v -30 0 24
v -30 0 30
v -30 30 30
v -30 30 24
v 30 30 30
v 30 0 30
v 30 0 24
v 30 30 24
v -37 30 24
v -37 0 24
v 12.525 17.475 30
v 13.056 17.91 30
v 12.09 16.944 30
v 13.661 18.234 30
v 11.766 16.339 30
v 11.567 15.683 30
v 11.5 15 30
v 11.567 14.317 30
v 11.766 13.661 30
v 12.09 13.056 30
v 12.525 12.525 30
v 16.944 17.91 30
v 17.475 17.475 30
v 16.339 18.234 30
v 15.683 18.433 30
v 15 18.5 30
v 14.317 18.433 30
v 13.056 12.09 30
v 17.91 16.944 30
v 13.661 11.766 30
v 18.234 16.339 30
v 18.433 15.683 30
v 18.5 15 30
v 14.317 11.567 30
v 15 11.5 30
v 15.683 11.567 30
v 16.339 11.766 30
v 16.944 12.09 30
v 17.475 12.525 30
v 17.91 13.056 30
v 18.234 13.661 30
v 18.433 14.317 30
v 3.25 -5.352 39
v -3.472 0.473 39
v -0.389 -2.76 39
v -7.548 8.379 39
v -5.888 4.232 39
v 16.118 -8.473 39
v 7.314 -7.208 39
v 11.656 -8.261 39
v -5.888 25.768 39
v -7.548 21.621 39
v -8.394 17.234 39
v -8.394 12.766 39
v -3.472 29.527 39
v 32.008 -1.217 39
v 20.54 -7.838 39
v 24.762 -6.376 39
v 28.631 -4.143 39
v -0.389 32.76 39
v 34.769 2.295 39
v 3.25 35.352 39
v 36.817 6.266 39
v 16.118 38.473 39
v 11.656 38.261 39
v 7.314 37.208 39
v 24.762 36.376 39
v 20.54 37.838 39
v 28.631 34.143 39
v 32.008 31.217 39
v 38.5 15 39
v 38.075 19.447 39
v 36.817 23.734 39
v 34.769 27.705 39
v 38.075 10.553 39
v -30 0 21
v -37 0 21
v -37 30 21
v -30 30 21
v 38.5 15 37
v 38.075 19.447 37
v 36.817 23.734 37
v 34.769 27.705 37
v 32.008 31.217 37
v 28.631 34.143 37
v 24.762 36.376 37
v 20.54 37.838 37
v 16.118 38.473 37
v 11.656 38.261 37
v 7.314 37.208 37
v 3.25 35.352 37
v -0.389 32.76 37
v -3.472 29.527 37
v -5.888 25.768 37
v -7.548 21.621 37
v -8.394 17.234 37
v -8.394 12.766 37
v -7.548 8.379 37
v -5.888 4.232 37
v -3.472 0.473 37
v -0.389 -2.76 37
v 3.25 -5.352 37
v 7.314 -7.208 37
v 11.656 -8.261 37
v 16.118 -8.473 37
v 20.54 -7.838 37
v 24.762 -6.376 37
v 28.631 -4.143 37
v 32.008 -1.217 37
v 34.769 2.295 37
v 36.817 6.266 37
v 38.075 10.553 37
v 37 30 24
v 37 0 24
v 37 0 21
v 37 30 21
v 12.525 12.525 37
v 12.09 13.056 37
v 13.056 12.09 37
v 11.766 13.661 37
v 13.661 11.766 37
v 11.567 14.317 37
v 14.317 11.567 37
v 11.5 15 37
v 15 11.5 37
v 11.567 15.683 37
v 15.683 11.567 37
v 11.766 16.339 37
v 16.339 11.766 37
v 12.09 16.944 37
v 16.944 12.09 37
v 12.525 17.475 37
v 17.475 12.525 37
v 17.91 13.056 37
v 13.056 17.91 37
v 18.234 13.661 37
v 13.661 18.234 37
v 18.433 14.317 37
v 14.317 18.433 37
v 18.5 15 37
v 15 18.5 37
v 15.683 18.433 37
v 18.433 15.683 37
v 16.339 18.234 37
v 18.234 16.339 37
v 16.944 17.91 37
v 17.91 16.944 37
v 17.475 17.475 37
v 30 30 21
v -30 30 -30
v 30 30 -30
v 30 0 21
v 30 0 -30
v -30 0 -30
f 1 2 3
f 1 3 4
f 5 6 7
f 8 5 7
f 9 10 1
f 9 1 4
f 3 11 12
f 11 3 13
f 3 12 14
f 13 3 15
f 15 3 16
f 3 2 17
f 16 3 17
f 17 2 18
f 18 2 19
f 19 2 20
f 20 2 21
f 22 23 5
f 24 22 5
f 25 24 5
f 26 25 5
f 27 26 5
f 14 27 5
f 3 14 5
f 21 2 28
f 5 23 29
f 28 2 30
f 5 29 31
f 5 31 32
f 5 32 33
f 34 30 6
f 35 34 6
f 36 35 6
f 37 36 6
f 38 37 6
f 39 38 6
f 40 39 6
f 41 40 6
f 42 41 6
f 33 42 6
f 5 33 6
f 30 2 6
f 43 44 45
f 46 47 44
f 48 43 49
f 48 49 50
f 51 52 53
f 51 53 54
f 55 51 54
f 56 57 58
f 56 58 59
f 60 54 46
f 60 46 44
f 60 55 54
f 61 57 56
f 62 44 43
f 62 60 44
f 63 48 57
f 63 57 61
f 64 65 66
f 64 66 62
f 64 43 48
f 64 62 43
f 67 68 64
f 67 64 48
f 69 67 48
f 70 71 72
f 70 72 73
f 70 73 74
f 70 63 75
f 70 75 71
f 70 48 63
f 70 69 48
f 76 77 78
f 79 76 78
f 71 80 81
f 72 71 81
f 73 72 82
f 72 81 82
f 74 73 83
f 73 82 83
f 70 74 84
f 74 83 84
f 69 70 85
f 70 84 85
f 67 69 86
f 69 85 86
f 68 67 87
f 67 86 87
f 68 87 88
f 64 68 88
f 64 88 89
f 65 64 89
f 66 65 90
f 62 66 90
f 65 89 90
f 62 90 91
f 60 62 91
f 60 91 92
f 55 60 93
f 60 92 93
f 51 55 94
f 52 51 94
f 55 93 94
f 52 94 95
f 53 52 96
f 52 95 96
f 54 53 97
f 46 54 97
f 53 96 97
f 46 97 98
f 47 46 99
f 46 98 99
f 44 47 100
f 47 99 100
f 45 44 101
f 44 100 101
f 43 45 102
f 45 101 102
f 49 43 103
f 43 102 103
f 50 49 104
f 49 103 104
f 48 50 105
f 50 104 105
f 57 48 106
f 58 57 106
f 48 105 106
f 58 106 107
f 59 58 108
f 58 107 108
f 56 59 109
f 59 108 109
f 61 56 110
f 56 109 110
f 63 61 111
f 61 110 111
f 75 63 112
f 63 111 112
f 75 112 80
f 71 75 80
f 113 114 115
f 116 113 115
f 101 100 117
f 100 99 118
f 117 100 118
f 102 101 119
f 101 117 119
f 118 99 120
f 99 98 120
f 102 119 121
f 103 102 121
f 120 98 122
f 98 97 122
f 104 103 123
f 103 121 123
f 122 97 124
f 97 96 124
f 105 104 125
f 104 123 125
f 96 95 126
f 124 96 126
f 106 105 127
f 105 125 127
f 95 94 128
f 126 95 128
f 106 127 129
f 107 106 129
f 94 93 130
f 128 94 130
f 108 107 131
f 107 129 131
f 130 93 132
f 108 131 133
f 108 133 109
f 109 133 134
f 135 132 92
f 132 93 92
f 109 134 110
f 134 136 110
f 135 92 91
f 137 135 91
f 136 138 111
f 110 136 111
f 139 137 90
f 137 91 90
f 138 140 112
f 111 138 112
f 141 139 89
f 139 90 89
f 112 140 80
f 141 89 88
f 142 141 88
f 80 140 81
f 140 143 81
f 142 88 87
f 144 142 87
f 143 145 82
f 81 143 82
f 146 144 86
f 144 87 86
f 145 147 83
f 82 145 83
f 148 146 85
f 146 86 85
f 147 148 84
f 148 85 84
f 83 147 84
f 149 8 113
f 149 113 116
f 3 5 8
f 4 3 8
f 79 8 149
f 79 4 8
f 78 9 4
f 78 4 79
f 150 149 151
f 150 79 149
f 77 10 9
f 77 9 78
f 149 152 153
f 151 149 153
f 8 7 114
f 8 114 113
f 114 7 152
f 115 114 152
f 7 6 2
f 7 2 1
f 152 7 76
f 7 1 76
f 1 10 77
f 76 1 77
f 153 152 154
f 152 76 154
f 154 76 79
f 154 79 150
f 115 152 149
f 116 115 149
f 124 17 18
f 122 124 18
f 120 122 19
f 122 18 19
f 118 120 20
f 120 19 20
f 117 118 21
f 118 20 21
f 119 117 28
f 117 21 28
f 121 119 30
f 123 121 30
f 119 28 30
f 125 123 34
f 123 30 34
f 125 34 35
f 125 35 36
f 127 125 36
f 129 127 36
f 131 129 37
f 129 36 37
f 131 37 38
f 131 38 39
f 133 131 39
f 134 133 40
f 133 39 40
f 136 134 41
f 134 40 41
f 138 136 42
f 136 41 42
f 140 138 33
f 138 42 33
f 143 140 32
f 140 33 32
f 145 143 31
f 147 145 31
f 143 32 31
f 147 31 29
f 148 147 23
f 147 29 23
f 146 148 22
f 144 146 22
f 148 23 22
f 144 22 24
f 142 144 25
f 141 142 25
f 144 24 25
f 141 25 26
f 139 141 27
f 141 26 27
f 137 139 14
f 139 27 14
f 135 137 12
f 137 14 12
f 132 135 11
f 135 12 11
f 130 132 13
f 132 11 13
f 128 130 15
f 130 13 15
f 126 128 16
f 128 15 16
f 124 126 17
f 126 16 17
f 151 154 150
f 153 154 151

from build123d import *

# Parameters (mm, degrees)
SKETCH_1_W           = 60
SKETCH_1_H           = 60
EXTRUDE_2_DEPTH      = 30
SKETCH_3_R           = 3.5
EXTRUDE_3_DEPTH      = 7
SKETCH_4_R           = 23.5
EXTRUDE_4_DEPTH      = 2
EXTRUDE_5_DEPTH      = 7
EXTRUDE_5_DEPTH_BACK = 67
SKETCH_5_W           = 3
SKETCH_5_H           = 30


with BuildPart() as part:
    # 草图1 → 凸台-拉伸2 (new body)
    with BuildSketch(Plane(origin=(0, 0, 0), x_dir=(1, 0, 0), z_dir=(0, 1, 0))):
        Rectangle(SKETCH_1_W, SKETCH_1_H)
    extrude(amount=EXTRUDE_2_DEPTH)

    # 草图3 → 凸台-拉伸3 (add)
    with BuildSketch(Plane.XY.offset(30)):
        with Locations(Location((15, 15, 0), (0, 0, 180))):
            Circle(SKETCH_3_R)
    extrude(amount=EXTRUDE_3_DEPTH)

    # 草图4 → 凸台-拉伸4 (add)
    with BuildSketch(Plane.XY.offset(37)):
        with Locations((15, 15)):
            Circle(SKETCH_4_R)
    extrude(amount=EXTRUDE_4_DEPTH)

    # 草图5 → 凸台-拉伸5 (add, two sides: drawn at the far end of the back side and taken through both)
    with BuildSketch(Plane(origin=(30, 0, 0), x_dir=(0, 0, -1), z_dir=(1, 0, 0)).offset(-EXTRUDE_5_DEPTH_BACK)):
        with Locations((-22.5, 15)):
            Rectangle(SKETCH_5_W, SKETCH_5_H)
    extrude(amount=EXTRUDE_5_DEPTH + EXTRUDE_5_DEPTH_BACK)


solid = part.part
